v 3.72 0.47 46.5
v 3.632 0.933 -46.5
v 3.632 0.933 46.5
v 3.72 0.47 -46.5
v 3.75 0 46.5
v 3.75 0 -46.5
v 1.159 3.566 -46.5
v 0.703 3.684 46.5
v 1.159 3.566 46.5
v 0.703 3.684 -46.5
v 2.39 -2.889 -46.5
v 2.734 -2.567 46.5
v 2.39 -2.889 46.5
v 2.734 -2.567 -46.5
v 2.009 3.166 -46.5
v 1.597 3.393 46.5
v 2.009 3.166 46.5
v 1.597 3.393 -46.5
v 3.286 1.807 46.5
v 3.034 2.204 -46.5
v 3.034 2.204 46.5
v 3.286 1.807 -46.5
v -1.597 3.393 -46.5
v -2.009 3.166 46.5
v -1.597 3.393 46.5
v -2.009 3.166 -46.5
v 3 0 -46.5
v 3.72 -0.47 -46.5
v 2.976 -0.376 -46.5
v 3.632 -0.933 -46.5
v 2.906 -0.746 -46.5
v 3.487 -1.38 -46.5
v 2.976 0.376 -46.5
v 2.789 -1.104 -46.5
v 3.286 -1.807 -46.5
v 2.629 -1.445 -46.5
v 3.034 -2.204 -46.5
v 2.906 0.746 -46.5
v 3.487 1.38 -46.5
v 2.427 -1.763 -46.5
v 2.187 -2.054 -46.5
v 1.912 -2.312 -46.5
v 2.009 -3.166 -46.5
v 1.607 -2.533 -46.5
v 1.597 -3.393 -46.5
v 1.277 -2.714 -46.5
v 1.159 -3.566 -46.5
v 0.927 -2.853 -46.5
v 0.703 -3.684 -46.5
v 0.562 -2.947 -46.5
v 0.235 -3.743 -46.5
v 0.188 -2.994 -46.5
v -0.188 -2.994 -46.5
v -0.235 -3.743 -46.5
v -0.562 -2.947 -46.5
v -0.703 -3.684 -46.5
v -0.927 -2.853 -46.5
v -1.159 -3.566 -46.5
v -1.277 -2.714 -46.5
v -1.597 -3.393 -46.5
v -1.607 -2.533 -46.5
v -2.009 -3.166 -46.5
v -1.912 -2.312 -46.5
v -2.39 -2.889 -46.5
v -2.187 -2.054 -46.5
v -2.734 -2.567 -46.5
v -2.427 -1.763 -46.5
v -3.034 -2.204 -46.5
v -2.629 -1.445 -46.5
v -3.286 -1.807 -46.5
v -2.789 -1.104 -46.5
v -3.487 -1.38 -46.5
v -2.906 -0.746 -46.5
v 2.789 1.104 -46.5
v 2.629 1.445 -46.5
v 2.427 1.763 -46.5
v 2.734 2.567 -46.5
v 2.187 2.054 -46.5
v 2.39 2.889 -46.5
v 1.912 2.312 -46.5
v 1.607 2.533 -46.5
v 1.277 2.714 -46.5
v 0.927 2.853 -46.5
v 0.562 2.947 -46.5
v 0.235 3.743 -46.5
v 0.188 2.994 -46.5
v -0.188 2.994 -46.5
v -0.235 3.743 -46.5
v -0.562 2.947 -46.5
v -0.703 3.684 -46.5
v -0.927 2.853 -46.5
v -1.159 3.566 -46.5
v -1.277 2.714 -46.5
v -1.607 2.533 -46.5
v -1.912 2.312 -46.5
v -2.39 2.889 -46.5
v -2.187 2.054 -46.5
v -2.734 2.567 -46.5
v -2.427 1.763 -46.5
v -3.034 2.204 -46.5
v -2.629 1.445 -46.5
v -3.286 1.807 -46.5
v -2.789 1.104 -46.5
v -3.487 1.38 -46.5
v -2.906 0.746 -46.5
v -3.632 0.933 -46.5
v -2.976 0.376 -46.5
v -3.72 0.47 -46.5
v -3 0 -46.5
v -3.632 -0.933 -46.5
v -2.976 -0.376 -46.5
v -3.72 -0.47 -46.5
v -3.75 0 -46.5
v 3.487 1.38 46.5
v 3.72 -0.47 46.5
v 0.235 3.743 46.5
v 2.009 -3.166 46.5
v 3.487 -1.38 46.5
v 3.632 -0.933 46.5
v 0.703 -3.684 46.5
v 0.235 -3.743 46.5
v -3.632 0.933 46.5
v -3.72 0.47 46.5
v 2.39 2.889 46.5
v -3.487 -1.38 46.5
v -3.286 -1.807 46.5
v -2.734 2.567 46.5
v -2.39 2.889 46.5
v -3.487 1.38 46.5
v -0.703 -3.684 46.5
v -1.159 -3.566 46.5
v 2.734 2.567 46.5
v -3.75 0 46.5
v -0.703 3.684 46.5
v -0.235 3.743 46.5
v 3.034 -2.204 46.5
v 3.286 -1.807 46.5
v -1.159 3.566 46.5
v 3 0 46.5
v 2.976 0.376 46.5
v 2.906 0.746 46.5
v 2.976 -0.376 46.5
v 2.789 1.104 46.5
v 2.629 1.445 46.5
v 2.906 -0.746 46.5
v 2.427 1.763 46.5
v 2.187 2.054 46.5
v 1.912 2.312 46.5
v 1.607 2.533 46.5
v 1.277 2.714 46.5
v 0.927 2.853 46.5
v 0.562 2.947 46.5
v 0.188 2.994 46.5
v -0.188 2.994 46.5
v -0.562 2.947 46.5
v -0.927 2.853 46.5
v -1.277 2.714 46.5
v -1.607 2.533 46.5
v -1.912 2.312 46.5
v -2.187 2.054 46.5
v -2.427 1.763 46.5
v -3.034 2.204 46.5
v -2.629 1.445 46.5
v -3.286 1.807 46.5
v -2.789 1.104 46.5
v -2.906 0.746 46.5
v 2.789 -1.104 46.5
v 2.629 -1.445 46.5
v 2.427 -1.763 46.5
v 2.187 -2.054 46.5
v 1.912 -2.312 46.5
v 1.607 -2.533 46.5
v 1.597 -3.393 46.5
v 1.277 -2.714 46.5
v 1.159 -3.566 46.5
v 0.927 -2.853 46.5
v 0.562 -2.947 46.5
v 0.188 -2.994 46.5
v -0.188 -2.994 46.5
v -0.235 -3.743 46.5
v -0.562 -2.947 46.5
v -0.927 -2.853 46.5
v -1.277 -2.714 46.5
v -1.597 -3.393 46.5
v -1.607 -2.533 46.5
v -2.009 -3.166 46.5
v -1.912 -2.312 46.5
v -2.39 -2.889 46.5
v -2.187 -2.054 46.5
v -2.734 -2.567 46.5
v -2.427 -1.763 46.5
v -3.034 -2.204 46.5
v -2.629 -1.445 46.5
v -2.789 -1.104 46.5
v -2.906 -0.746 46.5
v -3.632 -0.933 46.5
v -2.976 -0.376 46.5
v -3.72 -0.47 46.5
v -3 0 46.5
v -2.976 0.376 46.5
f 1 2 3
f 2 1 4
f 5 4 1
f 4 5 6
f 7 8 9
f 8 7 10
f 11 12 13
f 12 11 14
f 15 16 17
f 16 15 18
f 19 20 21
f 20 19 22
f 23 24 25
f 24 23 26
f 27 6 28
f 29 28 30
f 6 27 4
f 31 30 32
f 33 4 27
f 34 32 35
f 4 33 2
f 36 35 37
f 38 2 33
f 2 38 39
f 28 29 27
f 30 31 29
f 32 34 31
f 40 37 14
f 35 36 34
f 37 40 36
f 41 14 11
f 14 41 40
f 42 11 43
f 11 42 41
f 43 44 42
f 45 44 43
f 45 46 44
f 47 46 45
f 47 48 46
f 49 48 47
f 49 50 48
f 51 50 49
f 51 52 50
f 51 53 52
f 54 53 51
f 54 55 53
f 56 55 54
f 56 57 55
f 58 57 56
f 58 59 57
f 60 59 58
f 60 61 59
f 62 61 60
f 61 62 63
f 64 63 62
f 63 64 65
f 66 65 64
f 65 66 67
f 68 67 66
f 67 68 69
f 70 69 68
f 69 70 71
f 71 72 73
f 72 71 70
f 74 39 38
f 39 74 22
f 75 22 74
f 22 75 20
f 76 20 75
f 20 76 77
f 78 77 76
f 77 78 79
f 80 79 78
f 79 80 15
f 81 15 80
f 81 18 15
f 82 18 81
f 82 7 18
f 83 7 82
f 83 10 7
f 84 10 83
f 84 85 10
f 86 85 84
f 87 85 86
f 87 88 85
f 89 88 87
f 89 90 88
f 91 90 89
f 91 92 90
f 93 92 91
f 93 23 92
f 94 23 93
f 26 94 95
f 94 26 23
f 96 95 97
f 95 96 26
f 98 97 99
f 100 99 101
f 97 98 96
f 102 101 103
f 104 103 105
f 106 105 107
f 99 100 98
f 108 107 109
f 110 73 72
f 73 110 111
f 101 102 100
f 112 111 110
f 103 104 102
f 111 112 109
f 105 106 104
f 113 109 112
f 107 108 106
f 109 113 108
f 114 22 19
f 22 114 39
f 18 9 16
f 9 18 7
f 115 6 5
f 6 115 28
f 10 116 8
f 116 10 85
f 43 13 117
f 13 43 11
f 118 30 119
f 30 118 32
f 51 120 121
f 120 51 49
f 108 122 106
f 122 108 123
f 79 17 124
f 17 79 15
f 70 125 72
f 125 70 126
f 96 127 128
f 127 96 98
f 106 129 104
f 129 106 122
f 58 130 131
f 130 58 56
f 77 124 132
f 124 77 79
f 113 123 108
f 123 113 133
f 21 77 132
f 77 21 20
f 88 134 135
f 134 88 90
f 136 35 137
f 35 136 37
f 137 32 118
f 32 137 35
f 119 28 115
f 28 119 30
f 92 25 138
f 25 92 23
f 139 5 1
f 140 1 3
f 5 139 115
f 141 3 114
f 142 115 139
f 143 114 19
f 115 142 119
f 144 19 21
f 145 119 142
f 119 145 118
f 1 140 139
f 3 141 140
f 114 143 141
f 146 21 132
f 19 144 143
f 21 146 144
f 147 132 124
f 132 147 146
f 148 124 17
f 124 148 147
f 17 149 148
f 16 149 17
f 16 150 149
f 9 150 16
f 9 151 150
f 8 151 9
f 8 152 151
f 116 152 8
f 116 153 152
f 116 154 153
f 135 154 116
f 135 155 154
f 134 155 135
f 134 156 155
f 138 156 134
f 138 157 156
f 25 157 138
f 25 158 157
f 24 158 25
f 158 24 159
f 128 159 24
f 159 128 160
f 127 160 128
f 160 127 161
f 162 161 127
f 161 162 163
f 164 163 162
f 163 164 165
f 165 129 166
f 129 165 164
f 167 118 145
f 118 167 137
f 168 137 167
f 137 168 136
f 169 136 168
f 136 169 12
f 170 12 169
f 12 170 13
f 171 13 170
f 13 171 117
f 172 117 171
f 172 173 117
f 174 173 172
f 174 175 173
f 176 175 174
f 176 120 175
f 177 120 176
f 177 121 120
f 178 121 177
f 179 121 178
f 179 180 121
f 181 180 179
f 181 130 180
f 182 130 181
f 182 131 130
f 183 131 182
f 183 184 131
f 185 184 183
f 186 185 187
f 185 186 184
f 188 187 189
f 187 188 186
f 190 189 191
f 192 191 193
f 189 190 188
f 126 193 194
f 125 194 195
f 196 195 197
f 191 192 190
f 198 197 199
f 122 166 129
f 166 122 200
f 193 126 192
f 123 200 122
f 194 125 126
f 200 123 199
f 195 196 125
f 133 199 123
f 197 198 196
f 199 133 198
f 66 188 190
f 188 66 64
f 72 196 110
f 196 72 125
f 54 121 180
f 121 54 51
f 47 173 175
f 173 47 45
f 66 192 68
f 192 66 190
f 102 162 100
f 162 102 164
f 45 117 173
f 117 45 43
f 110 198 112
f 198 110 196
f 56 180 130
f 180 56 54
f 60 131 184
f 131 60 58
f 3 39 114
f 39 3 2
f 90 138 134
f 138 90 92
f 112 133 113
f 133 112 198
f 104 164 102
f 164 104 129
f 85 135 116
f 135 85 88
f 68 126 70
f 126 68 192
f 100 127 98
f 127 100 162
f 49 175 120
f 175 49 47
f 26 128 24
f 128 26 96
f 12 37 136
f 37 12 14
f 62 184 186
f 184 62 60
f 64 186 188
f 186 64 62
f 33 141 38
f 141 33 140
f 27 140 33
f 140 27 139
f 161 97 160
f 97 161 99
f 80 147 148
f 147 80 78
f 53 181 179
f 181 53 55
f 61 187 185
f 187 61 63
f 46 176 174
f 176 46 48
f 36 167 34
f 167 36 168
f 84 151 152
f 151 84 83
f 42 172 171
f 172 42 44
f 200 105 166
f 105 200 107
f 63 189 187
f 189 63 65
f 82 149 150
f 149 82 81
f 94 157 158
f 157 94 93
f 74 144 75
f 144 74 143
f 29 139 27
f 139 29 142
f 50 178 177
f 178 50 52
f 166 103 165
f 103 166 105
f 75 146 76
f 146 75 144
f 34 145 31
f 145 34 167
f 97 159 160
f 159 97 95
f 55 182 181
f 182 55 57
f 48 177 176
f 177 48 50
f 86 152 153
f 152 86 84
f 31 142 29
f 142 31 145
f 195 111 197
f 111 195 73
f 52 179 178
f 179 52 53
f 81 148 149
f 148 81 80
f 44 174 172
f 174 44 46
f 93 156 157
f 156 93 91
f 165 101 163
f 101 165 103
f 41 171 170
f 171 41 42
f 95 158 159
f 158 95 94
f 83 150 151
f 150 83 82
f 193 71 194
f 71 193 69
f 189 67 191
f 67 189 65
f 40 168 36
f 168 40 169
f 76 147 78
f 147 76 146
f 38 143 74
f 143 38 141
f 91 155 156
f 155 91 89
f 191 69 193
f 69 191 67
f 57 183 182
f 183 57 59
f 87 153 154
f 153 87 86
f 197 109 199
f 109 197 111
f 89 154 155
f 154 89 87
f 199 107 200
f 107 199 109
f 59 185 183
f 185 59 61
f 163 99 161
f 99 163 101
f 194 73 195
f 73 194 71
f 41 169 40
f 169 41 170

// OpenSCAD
$fn = 50;


difference() {
	union() {
		translate(v = [0, 0, -46.5000000000]) {
			cylinder(h = 93, r = 3.7500000000);
		}
	}
	union() {
		translate(v = [0, 0, -100.0000000000]) {
			cylinder(h = 200, r = 3.0000000000);
		}
	}
}
